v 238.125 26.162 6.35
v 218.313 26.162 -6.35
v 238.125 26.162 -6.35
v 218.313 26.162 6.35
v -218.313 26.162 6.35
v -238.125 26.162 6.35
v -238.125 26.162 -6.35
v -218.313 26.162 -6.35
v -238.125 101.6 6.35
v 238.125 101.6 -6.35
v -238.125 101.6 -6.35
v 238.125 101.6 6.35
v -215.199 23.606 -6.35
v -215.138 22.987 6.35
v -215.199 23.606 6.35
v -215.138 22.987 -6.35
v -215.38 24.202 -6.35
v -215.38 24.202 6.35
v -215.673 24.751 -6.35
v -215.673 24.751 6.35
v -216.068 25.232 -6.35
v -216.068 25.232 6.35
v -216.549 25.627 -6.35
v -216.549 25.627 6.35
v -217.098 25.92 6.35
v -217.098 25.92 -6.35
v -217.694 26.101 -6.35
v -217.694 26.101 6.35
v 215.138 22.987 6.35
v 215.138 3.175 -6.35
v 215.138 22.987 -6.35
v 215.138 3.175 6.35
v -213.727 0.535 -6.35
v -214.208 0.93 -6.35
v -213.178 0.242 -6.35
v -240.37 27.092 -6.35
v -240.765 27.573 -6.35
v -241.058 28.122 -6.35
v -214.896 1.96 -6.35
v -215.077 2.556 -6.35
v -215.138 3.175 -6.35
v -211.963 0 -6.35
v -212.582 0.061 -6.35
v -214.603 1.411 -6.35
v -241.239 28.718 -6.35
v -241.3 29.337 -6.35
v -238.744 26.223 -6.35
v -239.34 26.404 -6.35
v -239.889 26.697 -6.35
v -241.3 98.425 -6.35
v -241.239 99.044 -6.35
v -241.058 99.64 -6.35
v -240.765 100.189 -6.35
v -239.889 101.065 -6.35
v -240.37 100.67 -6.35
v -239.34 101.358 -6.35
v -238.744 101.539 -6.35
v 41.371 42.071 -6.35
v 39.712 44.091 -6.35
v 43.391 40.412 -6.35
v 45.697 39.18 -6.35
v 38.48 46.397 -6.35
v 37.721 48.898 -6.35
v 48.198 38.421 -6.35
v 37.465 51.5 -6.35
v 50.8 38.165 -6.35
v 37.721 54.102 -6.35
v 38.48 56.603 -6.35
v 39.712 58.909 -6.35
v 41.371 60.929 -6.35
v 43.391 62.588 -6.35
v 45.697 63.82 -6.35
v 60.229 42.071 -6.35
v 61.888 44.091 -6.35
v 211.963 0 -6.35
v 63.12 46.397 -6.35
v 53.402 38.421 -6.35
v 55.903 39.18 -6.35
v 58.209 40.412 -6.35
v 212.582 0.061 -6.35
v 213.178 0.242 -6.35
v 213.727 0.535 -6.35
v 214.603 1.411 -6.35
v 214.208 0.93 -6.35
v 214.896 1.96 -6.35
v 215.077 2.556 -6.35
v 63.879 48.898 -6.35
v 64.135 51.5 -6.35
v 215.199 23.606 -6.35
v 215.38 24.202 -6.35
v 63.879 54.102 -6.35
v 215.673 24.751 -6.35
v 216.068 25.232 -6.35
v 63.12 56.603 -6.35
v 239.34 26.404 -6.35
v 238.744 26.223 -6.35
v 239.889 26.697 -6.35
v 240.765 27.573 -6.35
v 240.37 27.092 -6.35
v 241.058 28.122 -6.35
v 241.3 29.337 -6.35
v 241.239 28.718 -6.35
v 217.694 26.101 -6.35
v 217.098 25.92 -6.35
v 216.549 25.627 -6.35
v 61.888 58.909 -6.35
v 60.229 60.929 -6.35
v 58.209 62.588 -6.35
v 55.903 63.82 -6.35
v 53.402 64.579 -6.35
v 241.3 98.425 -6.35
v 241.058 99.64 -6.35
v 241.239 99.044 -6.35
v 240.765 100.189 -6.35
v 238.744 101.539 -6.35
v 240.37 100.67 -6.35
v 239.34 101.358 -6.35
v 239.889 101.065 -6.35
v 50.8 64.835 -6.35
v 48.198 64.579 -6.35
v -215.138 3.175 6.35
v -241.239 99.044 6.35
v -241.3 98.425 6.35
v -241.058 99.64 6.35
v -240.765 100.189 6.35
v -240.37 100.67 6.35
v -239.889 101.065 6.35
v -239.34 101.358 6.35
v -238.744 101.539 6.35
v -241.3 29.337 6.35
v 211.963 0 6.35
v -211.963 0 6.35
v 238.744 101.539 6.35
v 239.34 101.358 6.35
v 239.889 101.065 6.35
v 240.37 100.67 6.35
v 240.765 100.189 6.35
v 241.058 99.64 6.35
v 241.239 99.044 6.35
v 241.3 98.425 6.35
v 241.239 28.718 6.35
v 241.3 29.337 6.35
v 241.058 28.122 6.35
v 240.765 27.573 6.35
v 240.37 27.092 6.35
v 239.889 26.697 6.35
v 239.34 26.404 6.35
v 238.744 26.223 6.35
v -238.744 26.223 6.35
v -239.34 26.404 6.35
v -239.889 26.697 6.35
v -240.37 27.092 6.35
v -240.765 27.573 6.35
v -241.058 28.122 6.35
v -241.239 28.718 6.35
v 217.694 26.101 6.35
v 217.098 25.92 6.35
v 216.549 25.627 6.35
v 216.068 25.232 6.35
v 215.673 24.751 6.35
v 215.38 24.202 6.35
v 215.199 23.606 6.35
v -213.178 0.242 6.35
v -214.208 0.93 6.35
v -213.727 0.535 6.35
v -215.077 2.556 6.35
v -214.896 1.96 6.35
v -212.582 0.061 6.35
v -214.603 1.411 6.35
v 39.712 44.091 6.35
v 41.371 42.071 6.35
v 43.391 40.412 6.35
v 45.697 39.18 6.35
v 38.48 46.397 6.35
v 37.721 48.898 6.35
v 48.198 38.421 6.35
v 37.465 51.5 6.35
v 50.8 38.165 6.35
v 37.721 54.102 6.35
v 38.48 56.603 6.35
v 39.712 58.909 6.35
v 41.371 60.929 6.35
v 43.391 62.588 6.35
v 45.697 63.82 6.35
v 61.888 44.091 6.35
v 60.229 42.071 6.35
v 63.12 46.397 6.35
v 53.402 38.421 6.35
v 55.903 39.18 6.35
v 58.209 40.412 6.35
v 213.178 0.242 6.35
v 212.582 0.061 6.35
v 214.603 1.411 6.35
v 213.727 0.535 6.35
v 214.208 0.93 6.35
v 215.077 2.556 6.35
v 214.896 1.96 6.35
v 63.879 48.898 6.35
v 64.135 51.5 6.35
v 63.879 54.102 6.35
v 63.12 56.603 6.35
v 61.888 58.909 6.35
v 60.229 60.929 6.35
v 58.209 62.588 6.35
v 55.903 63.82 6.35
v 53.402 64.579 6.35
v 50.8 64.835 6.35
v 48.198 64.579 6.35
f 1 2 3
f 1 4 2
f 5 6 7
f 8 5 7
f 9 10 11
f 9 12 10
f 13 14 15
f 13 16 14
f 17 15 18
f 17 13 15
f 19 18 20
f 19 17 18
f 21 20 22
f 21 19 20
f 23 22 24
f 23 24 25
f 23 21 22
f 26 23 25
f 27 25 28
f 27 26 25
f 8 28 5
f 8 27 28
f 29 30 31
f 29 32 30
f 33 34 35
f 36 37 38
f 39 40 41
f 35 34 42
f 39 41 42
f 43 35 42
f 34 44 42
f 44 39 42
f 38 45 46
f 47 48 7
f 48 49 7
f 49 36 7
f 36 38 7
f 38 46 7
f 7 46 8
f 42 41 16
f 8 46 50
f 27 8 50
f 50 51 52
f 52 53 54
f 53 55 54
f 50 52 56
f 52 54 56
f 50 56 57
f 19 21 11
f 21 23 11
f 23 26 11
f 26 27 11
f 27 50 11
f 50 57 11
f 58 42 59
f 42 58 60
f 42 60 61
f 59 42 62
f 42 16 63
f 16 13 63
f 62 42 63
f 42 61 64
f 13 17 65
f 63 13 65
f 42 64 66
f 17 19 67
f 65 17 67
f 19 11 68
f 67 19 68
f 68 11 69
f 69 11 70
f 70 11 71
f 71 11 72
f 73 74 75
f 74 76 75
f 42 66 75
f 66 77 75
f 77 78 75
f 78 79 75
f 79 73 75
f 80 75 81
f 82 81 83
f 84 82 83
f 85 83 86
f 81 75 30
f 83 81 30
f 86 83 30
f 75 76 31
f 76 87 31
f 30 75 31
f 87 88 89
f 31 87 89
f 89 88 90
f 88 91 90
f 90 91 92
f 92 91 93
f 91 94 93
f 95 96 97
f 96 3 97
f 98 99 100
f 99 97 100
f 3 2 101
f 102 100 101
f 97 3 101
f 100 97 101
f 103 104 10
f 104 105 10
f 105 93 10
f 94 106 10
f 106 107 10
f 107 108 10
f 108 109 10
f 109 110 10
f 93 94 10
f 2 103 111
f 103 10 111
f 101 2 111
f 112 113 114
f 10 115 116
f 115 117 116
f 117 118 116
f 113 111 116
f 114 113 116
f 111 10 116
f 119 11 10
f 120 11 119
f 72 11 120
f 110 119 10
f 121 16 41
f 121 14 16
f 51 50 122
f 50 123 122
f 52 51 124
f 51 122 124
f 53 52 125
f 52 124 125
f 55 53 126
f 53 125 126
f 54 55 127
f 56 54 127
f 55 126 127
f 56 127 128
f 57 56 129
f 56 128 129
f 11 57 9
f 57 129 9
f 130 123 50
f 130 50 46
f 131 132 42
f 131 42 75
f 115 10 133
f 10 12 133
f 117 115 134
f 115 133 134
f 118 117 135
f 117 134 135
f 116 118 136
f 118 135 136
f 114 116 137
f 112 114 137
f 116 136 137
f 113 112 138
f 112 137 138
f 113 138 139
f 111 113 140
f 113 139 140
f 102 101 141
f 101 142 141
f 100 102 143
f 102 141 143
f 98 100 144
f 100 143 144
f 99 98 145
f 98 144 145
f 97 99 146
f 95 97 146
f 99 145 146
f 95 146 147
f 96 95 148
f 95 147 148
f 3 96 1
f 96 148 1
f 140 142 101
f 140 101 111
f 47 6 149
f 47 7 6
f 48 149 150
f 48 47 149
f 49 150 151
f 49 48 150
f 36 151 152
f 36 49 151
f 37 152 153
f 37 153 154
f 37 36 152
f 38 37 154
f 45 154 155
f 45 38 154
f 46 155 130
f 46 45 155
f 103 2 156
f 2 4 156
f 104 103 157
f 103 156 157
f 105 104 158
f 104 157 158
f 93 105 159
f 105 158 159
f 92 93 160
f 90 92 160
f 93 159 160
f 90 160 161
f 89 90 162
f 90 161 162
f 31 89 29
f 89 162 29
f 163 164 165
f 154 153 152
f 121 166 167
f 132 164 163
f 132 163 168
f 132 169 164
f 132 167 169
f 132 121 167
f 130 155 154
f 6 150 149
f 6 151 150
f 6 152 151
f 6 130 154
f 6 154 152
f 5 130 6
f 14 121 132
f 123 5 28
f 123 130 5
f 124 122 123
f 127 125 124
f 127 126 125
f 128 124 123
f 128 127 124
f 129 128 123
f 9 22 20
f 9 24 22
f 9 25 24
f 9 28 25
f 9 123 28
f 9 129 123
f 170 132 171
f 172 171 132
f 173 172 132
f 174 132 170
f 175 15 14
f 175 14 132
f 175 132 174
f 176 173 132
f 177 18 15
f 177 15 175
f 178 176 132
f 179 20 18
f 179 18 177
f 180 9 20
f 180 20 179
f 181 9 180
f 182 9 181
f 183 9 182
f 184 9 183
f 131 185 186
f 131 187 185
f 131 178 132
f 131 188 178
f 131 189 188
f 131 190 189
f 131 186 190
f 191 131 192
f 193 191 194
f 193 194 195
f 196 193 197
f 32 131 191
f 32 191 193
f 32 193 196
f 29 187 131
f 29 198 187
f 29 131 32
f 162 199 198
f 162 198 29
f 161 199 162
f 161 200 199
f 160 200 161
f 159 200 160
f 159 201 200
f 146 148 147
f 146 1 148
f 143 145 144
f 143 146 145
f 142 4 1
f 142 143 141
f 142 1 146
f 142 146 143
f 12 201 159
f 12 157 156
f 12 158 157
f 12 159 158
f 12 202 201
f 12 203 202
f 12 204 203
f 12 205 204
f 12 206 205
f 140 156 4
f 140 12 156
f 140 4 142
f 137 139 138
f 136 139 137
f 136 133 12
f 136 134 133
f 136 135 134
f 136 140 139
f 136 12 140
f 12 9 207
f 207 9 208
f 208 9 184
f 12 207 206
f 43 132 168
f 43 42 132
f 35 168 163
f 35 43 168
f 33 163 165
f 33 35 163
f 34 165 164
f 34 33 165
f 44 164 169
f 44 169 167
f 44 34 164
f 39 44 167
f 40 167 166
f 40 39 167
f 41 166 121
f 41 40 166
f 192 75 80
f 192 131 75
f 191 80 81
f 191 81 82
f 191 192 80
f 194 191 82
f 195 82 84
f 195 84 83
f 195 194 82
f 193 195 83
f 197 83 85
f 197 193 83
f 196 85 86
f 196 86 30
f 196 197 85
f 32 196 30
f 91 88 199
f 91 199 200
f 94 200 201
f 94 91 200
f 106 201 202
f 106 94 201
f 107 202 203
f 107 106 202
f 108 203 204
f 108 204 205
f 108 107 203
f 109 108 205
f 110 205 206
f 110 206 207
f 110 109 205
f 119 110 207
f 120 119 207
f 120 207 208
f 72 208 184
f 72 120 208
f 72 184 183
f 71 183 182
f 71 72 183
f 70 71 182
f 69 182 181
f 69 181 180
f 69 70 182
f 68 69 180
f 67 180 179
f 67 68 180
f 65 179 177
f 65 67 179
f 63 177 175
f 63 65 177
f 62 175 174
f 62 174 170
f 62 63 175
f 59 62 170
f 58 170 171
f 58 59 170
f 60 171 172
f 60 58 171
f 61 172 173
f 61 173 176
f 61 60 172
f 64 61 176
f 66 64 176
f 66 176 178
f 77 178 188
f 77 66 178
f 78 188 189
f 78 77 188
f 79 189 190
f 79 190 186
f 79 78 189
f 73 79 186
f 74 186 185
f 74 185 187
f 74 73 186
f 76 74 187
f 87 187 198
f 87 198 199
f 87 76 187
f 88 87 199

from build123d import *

# Parameters (mm, degrees)
BOSS_EXTRUDE1_DEPTH = 6.35
CAVITY1_START       = -6.35
CAVITY1_OUTLINE_R   = 12.7
CAVITY1_DEPTH       = 12.7
MOVE_FACE_SLOT_BY   = 0.762
MOVE_FACE_SLOT_2_BY = 0.762
MOVE_FACE_SLOT_3_BY = 0.762
MOVE_FACE_SLOT_4_BY = 0.762
FILLET1_R           = 3.175
MOVE_FACE_HOLE_BY   = 0.635


# Read off the part's stored shape, not the designer's step: Cavity1
with BuildPart() as part:
    # Sketch1 → Boss-Extrude1 (new, symmetric)
    with BuildSketch(Plane.XY):
        Polygon((-215.9, 0), (215.9, 0), (215.9, 25.4), (241.3, 25.4), (241.3, 101.6), (-241.3, 101.6), (-241.3, 25.4), (-215.9, 25.4), align=None)
    extrude(amount=BOSS_EXTRUDE1_DEPTH, both=True)

    # Cavity1 outline → Cavity1 (cut)
    with BuildSketch(Plane.XY.offset(CAVITY1_START)):
        with Locations((50.8, 51.5)):
            Circle(CAVITY1_OUTLINE_R)
    extrude(amount=CAVITY1_DEPTH, mode=Mode.SUBTRACT)

    # Move Face slot: a face moved inward by 0.762
    extrude(part.faces().sort_by_distance((-228.6, 25.4, 0))[0], amount=MOVE_FACE_SLOT_BY, dir=(0, 1, 0), mode=Mode.SUBTRACT)

    # Move Face slot 2: a face moved inward by 0.762
    extrude(part.faces().sort_by_distance((-215.9, 12.7, 0))[0], amount=MOVE_FACE_SLOT_2_BY, dir=(1, 0, 0), mode=Mode.SUBTRACT)

    # Move Face slot 3: a face moved inward by 0.762
    extrude(part.faces().sort_by_distance((215.9, 12.7, 0))[0], amount=MOVE_FACE_SLOT_3_BY, dir=(-1, 0, 0), mode=Mode.SUBTRACT)

    # Move Face slot 4: a face moved inward by 0.762
    extrude(part.faces().sort_by_distance((228.6, 25.4, 0))[0], amount=MOVE_FACE_SLOT_4_BY, dir=(0, 1, 0), mode=Mode.SUBTRACT)

    # Fillet1
    fillet1_edges = [part.edges().sort_by_distance(p)[0] for p in [
        (215.138, 0, 0),
        (215.138, 26.162, 0),
        (241.3, 26.162, 0),
        (241.3, 101.6, 0),
        (-241.3, 101.6, 0),
        (-241.3, 26.162, 0),
        (-215.138, 26.162, 0),
        (-215.138, 0, 0),
    ]]
    fillet(fillet1_edges, radius=FILLET1_R)

    # Move Face hole: a curved face moved inward by 0.635
    add(Solid.thicken(part.faces().sort_by_distance((38.1, 51.5, 0))[0], -MOVE_FACE_HOLE_BY), mode=Mode.SUBTRACT)


solid = part.part
